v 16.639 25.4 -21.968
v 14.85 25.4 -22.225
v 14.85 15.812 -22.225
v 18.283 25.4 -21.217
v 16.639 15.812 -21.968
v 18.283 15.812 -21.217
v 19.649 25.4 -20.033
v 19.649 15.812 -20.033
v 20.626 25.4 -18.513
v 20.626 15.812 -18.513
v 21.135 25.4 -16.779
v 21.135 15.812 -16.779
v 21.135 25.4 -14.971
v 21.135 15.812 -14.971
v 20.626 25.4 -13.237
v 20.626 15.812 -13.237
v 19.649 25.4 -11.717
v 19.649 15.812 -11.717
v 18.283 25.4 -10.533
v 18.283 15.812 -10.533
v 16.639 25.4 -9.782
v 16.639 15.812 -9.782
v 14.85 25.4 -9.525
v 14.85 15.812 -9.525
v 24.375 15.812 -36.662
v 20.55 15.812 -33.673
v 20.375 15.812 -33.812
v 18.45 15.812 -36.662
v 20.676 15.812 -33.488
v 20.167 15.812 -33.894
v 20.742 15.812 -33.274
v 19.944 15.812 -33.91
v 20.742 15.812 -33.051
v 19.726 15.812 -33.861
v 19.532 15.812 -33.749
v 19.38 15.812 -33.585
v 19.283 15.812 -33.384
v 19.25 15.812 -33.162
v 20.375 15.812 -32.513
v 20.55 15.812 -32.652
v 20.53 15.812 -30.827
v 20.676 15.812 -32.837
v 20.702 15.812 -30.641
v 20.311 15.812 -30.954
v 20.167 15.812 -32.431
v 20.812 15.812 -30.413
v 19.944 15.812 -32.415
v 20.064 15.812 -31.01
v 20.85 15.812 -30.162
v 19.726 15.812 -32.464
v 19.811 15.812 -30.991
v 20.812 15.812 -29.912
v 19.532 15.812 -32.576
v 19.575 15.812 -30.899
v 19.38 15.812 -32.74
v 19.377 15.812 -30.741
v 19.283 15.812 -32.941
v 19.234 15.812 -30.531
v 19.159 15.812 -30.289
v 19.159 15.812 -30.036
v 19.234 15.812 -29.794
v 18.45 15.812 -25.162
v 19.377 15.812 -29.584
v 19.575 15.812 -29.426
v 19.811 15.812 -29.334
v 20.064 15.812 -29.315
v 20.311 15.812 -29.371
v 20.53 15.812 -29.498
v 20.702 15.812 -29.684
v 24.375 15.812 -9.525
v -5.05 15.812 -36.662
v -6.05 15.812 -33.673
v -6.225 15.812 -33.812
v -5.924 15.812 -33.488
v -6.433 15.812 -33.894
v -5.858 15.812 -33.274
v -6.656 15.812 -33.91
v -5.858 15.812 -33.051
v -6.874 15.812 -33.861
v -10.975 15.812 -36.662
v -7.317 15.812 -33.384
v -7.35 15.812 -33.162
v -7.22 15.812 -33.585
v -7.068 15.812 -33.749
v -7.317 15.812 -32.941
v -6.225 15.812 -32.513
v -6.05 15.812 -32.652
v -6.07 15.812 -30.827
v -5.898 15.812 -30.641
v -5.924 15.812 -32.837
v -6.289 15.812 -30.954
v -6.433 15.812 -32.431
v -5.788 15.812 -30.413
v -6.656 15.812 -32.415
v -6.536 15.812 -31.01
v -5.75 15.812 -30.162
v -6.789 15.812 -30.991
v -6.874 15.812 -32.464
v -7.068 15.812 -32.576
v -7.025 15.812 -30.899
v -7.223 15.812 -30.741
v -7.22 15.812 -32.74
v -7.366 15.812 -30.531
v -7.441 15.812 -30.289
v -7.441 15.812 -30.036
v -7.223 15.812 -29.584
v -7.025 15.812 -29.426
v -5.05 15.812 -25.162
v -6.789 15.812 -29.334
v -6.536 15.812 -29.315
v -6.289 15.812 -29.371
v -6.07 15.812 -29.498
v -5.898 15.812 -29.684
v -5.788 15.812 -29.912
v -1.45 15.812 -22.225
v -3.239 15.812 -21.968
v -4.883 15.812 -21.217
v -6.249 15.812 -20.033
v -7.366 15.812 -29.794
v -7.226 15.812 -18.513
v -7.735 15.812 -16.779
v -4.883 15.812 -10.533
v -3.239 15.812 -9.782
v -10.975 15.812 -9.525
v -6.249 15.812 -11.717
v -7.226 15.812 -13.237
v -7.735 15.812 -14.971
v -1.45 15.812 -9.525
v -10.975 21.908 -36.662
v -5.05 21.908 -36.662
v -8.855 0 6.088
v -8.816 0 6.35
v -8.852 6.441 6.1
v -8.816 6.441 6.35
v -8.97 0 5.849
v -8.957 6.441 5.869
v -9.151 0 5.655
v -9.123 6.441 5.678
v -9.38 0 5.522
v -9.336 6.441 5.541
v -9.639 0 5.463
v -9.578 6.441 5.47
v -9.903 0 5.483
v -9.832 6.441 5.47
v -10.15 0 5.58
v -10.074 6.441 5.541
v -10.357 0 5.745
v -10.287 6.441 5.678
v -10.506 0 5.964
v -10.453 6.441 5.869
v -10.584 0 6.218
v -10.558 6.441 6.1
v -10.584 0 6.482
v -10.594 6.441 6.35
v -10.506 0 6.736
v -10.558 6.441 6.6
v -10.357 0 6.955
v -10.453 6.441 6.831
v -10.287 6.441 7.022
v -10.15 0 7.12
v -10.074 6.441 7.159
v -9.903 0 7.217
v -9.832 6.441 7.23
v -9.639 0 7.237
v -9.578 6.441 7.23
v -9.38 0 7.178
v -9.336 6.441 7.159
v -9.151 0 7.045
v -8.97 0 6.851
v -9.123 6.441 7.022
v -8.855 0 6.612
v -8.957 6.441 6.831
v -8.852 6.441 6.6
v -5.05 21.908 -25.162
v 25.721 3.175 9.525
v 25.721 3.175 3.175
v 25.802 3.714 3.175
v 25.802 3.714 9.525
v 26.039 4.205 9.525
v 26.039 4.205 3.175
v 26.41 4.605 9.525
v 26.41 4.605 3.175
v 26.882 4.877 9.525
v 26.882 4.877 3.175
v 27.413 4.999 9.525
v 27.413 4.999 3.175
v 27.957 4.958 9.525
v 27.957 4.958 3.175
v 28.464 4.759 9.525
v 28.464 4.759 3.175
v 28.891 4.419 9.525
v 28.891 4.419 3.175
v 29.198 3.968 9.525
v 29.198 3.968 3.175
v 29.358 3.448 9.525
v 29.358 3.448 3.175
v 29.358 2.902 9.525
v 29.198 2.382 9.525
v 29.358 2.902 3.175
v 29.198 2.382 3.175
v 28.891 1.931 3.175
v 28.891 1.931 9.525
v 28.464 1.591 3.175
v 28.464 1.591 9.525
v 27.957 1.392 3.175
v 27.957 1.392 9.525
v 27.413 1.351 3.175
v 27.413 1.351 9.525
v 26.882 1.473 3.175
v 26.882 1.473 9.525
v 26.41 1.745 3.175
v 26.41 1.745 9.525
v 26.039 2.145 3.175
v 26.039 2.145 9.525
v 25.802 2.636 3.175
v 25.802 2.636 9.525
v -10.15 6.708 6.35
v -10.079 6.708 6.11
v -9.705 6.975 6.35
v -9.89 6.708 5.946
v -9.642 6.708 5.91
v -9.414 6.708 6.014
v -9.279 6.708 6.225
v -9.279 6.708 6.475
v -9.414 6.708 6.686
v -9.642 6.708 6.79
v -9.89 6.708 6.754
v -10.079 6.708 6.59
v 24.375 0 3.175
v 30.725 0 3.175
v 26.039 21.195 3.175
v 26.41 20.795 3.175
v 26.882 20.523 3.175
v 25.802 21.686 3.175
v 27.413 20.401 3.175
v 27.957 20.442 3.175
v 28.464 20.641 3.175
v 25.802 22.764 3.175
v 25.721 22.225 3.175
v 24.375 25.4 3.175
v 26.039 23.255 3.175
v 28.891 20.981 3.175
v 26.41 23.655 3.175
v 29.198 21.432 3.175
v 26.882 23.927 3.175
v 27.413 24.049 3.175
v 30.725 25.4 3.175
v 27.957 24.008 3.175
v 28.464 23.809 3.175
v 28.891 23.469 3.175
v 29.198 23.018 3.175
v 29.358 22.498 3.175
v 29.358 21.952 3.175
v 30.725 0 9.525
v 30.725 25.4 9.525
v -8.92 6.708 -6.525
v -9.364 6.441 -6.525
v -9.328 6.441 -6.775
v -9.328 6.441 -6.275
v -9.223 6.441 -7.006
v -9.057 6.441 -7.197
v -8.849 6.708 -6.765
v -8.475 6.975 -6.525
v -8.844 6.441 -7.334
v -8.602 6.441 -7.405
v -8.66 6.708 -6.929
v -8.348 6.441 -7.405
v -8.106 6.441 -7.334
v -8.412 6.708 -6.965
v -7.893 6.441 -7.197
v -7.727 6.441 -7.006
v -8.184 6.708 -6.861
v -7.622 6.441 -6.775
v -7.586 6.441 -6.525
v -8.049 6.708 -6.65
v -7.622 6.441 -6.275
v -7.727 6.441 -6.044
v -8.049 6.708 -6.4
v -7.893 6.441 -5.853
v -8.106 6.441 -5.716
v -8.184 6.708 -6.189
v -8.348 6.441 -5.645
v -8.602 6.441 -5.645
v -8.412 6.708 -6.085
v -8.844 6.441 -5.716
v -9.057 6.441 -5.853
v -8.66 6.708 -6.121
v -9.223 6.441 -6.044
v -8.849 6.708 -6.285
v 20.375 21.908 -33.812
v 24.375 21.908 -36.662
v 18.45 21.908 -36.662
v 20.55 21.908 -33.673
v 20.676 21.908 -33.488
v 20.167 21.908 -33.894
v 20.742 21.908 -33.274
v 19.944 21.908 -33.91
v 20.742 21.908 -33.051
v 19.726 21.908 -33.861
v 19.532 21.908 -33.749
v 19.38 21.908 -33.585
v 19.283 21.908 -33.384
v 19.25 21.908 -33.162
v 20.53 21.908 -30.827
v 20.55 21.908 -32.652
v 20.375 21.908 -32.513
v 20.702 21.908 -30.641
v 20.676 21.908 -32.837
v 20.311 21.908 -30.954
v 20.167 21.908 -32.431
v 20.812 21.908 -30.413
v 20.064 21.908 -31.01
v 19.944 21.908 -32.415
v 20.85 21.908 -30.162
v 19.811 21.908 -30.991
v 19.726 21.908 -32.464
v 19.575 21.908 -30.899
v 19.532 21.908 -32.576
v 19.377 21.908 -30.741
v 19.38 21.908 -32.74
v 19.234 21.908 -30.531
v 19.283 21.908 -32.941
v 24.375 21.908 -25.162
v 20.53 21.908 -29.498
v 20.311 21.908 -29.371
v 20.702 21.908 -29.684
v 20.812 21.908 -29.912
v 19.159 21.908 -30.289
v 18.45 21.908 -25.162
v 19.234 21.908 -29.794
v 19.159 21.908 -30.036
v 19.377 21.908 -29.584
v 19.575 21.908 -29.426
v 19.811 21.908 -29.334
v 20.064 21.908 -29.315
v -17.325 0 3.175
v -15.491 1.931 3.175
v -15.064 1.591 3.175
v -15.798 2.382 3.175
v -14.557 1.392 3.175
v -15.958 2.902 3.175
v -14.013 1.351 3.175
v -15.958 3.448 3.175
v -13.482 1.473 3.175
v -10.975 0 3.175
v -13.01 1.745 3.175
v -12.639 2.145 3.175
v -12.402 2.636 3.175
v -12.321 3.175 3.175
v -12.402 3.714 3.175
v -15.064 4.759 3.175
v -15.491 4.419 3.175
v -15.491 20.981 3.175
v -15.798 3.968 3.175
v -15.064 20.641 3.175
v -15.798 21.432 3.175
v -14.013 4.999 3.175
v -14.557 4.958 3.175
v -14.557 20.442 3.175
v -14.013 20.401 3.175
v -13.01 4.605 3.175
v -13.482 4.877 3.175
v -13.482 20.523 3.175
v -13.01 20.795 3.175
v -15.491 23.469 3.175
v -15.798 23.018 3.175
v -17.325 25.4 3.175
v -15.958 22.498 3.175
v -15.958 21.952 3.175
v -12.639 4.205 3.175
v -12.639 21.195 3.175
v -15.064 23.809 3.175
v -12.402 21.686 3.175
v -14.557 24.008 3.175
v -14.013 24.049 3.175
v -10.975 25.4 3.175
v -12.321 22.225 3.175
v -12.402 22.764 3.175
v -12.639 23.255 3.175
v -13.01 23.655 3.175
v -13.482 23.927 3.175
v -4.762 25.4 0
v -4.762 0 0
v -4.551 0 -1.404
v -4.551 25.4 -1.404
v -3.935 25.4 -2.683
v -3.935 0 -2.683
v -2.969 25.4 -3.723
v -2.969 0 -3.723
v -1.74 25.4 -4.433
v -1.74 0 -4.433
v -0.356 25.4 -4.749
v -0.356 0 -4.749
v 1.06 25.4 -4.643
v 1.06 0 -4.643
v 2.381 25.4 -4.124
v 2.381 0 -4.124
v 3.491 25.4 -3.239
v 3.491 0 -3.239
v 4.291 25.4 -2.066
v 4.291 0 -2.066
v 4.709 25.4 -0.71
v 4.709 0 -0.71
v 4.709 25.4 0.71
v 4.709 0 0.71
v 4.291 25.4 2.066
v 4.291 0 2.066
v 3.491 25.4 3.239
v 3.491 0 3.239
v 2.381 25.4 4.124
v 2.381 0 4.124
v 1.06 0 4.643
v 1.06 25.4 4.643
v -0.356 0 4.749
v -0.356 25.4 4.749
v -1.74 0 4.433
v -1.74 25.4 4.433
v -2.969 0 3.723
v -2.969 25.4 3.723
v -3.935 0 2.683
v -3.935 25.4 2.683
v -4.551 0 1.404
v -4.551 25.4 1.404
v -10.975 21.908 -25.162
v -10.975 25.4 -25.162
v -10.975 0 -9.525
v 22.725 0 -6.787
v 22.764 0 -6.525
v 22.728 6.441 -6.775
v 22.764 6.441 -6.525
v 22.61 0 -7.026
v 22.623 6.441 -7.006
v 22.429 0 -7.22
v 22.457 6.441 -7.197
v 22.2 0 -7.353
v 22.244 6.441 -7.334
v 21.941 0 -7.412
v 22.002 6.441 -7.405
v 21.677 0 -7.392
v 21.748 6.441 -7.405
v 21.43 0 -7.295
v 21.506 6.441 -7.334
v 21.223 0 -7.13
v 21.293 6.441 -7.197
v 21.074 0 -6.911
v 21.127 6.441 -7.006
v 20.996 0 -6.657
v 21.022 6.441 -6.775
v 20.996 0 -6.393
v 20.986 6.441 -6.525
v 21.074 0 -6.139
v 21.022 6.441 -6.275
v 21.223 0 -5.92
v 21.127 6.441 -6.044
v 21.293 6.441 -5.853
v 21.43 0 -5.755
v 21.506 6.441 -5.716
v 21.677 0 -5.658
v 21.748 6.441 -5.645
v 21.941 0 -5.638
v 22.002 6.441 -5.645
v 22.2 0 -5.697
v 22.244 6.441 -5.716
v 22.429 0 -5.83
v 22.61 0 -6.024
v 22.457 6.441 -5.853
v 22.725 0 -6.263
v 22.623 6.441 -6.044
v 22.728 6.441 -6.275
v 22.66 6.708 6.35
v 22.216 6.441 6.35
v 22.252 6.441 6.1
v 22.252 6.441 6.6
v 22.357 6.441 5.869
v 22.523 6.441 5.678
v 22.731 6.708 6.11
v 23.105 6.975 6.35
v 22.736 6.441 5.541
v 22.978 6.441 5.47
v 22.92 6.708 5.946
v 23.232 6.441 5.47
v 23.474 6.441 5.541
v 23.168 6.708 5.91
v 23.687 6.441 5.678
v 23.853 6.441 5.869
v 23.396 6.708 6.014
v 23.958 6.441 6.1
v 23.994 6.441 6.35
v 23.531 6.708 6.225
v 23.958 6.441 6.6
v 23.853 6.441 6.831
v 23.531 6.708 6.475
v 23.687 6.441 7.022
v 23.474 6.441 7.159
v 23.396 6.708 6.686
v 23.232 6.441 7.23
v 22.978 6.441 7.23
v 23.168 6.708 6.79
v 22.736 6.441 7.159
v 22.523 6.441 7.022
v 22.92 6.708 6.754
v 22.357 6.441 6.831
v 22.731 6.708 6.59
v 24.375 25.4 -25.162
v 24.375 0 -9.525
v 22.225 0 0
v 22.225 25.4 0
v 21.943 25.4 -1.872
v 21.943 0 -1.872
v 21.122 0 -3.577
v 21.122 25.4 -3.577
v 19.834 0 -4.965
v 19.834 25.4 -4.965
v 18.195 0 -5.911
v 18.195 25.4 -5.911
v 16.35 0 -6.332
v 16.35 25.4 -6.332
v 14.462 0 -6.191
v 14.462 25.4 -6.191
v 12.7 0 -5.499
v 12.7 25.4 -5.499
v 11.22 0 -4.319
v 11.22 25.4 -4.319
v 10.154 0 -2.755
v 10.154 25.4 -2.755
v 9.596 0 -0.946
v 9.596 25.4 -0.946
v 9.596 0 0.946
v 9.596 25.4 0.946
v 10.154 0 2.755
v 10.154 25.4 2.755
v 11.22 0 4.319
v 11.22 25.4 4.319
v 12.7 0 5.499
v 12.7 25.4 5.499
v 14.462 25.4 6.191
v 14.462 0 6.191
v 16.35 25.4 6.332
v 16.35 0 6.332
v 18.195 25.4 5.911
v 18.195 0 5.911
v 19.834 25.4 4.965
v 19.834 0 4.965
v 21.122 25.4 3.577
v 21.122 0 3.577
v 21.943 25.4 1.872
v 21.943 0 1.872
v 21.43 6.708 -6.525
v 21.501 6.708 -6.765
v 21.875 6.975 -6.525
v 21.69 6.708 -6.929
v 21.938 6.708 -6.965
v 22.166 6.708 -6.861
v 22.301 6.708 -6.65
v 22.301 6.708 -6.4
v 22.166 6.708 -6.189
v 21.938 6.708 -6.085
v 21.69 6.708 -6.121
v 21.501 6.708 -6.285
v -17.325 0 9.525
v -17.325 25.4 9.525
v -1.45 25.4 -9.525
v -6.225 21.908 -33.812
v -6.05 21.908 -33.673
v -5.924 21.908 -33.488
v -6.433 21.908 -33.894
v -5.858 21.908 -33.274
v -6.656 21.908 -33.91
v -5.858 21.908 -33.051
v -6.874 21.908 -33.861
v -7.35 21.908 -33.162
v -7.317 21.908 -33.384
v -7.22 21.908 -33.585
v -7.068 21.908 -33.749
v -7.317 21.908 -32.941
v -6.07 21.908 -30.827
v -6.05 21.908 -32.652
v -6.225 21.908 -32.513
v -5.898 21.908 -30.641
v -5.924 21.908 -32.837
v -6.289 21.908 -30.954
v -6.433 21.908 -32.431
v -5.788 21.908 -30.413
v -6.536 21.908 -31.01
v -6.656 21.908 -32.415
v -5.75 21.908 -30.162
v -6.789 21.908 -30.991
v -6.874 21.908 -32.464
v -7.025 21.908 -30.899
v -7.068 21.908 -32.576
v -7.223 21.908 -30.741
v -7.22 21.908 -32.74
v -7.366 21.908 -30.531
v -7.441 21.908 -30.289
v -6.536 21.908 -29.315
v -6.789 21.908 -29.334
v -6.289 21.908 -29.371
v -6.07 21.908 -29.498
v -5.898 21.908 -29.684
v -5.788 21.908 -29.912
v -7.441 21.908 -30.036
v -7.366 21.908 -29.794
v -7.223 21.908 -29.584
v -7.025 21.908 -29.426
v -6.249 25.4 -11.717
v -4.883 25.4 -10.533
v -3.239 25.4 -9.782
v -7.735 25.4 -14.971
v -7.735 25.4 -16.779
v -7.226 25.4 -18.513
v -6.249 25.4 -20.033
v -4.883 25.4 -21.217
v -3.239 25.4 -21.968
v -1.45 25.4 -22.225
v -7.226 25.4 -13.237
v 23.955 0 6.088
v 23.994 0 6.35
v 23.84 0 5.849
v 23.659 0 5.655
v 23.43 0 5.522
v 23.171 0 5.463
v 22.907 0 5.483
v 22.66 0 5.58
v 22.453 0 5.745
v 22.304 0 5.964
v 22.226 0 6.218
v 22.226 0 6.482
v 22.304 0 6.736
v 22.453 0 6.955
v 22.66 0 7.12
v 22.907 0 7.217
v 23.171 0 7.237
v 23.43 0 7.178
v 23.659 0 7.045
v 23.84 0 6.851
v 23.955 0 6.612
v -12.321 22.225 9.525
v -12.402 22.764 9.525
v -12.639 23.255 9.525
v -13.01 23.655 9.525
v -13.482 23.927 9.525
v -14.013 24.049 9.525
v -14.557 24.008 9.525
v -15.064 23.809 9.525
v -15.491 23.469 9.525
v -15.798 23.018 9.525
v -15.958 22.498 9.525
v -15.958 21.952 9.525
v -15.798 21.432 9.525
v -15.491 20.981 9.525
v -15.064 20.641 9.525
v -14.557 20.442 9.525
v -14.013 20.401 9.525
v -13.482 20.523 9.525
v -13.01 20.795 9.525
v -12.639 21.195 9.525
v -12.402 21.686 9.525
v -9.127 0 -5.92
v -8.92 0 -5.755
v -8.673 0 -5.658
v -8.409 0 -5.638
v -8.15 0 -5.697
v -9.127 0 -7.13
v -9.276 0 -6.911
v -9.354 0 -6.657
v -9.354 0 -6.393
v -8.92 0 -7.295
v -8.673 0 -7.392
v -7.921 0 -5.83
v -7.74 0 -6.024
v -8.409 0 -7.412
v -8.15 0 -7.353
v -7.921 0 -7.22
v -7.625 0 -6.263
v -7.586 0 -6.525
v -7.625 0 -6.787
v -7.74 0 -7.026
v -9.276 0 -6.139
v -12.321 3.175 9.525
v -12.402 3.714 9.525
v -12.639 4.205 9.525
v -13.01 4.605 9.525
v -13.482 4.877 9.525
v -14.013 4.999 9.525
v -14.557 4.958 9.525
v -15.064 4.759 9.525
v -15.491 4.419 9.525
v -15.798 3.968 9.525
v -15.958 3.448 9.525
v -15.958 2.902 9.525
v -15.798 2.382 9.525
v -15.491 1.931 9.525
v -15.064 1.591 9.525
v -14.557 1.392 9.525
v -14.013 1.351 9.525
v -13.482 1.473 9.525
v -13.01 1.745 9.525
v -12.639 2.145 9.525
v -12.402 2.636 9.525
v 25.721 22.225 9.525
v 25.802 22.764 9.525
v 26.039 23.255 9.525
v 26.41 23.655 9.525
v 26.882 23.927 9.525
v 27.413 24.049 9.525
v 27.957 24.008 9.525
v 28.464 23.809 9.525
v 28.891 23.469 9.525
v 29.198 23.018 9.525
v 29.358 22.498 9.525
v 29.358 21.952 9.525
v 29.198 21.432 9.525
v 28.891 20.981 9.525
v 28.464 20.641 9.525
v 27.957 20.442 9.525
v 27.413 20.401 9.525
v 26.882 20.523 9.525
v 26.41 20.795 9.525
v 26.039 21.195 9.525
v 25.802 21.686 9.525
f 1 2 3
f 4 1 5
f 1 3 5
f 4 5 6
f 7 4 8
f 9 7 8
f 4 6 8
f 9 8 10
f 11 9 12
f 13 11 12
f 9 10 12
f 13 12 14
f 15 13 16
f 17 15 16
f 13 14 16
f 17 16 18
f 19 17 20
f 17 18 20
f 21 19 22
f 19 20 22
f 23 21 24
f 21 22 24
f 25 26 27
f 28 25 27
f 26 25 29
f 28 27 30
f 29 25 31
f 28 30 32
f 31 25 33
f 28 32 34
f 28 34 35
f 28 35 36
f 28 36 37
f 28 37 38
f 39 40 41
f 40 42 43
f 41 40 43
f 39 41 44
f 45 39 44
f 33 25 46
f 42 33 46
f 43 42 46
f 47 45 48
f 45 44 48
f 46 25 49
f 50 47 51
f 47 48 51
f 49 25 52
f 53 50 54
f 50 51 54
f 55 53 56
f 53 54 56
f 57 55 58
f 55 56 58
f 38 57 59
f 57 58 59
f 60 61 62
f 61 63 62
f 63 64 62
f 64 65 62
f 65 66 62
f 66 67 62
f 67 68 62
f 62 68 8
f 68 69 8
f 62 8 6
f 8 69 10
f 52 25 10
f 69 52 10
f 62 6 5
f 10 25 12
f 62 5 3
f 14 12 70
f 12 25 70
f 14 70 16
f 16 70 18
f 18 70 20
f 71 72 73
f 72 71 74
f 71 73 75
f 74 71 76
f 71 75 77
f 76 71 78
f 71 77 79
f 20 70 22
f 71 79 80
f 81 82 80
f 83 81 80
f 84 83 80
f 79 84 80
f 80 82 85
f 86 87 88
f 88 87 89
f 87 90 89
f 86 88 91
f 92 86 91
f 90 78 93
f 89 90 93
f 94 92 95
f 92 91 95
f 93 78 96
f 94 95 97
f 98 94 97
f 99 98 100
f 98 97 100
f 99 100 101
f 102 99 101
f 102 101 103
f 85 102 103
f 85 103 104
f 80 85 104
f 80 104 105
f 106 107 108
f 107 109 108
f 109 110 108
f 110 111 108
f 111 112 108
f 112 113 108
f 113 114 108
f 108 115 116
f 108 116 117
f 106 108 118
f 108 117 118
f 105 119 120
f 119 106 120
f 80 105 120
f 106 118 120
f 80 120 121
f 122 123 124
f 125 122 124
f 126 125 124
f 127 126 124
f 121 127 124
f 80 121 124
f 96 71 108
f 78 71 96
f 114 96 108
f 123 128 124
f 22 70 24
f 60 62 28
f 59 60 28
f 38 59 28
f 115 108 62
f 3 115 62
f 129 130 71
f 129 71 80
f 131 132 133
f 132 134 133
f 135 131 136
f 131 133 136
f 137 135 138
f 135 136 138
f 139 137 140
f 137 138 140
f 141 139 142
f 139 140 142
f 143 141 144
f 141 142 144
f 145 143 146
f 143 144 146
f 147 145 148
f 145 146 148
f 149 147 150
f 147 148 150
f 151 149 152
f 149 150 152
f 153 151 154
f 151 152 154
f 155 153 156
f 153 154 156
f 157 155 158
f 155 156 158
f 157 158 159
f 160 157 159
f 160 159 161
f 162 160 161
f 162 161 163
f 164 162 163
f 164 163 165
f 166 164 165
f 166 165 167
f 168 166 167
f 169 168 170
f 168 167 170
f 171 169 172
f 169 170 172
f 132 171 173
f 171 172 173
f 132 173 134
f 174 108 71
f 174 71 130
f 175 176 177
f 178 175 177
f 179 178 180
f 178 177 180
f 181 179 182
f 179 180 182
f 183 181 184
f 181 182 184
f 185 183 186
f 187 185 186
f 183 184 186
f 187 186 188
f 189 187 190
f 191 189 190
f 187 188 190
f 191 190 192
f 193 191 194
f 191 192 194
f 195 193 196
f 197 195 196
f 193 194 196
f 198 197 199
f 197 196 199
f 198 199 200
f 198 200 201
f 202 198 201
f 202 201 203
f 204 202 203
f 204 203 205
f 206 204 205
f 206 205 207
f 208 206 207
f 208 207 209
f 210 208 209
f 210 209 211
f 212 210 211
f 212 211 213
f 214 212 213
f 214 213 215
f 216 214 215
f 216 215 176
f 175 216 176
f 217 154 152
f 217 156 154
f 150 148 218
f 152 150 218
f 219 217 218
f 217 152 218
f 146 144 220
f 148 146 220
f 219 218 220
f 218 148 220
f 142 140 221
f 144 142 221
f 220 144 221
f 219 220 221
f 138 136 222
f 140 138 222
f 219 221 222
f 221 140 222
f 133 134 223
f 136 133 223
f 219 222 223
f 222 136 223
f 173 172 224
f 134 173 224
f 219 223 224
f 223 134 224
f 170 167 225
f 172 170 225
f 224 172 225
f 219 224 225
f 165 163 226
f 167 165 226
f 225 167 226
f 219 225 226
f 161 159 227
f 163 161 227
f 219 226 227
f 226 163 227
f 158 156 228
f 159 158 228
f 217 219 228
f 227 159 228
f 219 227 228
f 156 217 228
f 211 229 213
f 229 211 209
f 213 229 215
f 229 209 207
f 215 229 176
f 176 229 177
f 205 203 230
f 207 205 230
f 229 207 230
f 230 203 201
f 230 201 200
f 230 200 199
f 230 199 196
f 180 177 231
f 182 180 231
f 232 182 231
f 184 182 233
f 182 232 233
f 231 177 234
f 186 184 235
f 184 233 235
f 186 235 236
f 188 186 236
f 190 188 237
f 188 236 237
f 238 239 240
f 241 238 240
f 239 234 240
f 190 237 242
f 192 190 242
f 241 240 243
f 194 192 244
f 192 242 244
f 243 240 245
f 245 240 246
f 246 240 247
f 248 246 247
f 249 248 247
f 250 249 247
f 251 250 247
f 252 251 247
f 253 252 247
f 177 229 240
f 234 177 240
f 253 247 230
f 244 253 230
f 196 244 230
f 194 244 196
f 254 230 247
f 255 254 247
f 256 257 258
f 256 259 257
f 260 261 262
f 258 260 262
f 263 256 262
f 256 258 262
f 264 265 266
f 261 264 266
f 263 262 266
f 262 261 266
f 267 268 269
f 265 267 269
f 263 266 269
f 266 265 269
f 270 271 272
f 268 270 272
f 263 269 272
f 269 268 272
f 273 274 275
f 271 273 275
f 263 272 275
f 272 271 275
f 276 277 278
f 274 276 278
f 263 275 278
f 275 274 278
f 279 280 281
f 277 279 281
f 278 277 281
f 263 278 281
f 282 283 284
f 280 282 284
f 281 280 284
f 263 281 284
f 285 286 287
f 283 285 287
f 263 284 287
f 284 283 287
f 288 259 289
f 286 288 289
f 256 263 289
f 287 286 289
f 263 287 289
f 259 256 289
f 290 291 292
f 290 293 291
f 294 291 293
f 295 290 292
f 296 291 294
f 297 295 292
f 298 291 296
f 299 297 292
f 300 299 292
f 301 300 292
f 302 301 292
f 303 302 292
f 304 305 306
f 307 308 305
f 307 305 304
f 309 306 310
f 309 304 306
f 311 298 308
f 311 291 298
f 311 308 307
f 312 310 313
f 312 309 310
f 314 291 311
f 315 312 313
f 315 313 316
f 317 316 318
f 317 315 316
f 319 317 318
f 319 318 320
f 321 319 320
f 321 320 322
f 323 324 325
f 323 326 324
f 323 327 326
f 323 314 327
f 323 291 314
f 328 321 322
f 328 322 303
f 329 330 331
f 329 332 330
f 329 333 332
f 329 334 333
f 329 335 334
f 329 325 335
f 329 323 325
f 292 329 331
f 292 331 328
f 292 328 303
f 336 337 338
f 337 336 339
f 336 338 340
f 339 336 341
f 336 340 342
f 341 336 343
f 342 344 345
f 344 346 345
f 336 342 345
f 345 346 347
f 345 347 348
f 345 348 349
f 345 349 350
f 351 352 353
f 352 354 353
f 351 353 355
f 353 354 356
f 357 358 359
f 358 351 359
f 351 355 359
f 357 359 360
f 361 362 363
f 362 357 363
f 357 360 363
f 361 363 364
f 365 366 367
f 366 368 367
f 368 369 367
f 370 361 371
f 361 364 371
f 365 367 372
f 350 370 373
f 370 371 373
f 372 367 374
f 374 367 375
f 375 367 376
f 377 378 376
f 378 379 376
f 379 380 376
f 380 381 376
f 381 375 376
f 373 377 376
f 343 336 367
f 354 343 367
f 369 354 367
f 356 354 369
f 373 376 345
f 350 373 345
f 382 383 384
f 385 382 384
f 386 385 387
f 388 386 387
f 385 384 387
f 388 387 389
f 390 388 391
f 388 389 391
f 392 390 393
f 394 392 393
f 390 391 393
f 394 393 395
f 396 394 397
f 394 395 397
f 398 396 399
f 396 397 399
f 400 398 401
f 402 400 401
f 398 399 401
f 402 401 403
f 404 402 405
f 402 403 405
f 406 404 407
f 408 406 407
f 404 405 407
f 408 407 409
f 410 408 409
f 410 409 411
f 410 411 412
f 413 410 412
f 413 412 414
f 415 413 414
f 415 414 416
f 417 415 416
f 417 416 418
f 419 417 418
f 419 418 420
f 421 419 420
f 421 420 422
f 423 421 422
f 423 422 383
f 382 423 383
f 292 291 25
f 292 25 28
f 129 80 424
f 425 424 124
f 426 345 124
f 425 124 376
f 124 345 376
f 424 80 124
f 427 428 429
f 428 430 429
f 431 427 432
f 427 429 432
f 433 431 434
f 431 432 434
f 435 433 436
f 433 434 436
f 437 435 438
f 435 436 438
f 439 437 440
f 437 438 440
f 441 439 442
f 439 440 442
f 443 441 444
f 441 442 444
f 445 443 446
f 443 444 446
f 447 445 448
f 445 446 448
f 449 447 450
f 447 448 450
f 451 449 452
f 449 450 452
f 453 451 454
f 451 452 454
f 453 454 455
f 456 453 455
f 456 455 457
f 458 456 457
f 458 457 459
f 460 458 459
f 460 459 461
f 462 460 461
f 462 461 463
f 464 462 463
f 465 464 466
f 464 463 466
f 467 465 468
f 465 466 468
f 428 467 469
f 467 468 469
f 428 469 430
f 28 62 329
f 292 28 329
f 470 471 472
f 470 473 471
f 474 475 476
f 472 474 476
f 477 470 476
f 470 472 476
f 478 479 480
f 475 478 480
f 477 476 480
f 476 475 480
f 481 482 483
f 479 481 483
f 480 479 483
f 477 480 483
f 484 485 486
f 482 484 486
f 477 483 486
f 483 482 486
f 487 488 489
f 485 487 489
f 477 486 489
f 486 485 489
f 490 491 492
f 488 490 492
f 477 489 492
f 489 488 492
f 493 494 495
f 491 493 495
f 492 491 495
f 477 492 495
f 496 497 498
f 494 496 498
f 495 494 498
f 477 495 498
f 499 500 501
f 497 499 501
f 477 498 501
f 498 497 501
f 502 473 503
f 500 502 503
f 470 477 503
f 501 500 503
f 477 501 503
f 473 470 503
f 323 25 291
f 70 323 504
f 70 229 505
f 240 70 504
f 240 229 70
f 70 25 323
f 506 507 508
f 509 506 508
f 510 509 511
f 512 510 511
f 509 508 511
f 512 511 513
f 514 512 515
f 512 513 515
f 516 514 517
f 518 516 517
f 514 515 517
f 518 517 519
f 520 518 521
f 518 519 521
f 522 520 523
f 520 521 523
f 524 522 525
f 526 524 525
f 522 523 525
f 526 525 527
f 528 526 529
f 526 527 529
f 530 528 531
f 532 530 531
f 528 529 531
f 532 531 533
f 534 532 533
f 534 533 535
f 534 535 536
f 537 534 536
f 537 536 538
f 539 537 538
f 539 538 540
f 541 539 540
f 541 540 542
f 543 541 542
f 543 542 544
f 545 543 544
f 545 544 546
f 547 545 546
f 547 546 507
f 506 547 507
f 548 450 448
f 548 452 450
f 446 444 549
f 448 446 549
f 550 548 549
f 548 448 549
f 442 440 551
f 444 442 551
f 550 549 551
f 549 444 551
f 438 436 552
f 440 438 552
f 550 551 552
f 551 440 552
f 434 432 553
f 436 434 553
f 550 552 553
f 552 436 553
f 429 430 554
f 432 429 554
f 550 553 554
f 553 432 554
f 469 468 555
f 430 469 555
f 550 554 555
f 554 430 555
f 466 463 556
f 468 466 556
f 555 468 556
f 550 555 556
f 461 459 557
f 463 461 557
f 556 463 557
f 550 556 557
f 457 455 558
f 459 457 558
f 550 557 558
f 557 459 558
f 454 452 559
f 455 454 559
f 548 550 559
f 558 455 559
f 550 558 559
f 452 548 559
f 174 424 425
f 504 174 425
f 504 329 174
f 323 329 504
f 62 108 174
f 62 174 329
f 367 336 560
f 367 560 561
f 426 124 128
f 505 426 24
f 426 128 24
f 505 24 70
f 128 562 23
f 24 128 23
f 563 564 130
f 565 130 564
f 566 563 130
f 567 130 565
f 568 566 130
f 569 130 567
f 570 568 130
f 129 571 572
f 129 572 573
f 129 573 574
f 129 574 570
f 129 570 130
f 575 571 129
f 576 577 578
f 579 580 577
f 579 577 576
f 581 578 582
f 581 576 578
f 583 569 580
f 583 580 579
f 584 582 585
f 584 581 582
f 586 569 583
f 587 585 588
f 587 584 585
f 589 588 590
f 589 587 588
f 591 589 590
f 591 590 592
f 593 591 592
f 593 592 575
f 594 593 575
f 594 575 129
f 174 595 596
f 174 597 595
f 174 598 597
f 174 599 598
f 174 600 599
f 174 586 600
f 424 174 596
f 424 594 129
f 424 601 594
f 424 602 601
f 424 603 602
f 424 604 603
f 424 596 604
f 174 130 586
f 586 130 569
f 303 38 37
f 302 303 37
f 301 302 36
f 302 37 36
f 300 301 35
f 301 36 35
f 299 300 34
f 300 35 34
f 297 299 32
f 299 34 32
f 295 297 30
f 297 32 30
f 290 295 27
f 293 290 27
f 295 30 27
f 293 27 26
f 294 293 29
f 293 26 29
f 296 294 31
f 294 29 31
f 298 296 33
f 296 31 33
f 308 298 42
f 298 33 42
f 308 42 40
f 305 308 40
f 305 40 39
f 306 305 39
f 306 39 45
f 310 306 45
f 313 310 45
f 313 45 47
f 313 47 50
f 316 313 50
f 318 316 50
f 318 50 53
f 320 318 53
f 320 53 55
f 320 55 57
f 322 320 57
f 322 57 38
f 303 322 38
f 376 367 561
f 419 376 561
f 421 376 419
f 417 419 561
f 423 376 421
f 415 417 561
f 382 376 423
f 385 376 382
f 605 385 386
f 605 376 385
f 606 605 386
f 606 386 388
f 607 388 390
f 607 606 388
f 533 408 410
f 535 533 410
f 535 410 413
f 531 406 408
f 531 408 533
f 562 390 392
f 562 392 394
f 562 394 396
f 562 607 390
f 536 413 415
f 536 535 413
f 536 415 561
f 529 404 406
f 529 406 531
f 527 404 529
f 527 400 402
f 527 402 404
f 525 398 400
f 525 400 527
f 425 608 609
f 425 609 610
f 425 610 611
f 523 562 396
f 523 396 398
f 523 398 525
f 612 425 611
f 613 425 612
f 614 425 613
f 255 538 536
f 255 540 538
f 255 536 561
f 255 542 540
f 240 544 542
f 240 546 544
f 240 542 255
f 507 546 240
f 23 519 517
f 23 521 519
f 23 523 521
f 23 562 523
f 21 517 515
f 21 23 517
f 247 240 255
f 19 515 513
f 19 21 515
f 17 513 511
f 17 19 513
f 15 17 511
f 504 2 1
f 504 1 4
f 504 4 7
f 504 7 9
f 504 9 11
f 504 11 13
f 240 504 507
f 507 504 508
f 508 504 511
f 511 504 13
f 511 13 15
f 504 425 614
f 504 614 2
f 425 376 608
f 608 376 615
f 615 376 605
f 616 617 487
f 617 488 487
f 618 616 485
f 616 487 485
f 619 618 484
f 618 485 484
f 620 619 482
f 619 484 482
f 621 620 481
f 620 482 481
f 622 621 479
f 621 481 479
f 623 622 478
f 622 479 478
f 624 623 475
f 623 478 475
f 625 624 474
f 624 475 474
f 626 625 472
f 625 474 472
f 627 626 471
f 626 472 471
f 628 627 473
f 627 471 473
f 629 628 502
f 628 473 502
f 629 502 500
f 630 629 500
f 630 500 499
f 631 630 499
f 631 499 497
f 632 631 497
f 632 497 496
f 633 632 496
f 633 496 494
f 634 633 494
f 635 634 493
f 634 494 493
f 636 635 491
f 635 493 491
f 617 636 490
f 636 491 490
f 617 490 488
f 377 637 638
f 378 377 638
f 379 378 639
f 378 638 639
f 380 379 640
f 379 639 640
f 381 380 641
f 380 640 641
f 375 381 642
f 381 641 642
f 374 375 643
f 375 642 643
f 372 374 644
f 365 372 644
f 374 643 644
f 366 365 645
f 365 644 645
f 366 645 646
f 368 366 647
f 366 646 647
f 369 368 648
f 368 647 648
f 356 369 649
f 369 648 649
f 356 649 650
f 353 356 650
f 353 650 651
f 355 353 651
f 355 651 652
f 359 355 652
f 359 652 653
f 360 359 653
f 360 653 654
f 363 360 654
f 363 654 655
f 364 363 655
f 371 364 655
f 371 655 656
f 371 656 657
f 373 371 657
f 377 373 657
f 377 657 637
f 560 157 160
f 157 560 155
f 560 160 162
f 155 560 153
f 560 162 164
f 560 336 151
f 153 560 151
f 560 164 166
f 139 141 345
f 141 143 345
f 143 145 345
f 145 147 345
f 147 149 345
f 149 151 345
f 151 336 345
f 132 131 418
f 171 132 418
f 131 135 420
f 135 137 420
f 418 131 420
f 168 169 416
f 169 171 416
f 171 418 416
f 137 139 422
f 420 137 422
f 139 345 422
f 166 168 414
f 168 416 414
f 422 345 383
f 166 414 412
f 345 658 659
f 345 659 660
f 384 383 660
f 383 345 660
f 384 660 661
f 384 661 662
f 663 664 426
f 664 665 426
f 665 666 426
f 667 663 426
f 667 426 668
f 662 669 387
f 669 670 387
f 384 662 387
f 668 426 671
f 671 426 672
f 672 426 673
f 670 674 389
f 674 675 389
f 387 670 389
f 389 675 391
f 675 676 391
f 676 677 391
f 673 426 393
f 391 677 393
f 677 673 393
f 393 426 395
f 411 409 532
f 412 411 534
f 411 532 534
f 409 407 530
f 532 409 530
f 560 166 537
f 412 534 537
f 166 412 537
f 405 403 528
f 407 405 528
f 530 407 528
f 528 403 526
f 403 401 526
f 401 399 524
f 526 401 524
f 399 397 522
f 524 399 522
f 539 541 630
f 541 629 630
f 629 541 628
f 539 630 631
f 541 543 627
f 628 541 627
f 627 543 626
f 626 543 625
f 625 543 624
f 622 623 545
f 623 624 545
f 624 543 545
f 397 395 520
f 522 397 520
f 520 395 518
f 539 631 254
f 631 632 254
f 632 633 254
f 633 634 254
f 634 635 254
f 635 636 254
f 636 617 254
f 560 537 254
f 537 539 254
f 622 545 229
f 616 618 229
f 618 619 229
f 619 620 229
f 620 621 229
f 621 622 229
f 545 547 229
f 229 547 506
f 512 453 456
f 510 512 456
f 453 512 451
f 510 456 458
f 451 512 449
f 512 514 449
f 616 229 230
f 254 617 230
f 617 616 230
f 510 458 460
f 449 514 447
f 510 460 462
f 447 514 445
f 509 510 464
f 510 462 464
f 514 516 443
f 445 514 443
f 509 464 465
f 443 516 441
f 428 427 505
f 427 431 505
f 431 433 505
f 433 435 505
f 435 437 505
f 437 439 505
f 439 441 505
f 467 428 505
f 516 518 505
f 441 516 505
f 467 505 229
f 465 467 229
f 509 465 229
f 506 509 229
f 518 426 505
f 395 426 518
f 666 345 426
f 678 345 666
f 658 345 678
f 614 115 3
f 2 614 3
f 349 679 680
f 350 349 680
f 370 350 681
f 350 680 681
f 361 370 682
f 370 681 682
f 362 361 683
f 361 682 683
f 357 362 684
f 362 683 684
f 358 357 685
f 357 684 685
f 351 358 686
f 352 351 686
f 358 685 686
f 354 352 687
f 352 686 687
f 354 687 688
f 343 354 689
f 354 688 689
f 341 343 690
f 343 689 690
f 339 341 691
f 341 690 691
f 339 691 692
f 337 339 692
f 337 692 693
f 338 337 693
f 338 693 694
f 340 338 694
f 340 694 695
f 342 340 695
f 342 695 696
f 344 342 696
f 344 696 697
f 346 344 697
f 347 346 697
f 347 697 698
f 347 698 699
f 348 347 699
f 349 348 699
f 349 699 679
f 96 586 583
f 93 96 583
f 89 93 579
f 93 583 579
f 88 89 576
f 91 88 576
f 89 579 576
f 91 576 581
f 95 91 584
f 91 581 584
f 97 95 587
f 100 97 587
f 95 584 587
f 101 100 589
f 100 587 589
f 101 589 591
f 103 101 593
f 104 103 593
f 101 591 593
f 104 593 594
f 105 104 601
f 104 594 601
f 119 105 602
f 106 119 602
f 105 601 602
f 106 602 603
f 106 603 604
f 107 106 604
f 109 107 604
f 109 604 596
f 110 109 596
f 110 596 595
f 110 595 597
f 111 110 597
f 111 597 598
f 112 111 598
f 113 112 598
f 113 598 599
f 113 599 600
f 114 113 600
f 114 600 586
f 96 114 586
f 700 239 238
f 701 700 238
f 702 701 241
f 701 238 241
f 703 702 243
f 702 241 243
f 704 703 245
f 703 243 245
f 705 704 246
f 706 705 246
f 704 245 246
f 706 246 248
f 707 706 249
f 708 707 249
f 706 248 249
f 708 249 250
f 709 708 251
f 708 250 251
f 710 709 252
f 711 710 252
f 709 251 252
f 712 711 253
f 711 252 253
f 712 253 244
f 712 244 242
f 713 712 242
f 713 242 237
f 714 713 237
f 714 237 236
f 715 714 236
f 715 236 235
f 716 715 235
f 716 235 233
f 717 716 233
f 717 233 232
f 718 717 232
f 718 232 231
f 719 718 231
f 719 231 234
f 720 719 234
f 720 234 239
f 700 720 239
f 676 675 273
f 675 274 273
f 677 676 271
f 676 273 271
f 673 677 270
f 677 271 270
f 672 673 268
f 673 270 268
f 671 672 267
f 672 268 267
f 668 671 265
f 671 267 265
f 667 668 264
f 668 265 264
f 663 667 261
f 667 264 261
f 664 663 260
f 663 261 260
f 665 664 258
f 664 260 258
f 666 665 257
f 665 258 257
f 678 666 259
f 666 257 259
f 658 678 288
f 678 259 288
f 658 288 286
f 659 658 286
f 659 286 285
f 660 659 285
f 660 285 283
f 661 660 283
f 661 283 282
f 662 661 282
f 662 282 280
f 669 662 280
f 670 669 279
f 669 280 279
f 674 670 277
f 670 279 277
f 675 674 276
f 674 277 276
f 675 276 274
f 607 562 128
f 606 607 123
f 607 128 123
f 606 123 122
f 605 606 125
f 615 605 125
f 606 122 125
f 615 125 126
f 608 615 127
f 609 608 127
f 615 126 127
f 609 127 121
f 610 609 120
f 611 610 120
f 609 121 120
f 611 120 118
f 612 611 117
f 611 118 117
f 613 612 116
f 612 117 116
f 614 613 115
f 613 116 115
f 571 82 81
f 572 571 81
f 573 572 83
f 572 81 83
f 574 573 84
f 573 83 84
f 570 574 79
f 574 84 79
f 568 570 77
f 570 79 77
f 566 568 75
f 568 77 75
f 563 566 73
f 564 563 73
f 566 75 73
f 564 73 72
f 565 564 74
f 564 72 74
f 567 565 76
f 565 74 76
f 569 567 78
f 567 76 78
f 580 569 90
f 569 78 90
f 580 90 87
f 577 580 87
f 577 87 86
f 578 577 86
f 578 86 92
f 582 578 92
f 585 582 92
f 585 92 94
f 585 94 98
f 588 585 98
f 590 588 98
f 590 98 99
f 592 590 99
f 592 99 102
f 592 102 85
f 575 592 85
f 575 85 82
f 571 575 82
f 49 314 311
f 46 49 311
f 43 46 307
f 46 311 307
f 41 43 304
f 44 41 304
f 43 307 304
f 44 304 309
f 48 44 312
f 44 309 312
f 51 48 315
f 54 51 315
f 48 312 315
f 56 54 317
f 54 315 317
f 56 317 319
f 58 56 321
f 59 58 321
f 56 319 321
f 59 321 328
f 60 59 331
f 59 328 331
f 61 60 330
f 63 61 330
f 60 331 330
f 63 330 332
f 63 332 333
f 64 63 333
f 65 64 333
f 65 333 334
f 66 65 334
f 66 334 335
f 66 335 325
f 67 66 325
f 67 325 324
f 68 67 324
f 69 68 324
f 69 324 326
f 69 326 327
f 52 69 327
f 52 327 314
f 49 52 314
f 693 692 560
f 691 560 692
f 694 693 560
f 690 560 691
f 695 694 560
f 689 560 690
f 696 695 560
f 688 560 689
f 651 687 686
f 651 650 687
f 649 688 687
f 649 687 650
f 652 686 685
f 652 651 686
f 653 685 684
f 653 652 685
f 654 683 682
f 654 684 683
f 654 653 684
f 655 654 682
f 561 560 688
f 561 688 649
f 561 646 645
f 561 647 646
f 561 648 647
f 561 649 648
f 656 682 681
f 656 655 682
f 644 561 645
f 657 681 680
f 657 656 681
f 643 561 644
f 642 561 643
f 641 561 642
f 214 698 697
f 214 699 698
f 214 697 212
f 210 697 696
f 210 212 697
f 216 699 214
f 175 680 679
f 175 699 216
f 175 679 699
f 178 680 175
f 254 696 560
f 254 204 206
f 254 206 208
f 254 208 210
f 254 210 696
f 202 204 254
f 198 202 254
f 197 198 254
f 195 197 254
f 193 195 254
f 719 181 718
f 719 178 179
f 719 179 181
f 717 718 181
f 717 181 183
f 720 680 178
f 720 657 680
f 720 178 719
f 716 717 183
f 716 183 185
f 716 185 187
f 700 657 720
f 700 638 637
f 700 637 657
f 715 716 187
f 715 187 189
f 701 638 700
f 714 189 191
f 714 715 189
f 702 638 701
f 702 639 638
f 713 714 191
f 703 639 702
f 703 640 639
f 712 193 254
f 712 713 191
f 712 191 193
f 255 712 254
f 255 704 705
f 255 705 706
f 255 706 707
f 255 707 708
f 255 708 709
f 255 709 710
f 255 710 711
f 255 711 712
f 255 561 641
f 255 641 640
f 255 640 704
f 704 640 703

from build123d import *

# Parameters (mm, degrees)
EXTRUDE_START               = 15.8125
EXTRUDE_1_OUTLINE_W         = 35.35
EXTRUDE_1_OUTLINE_H         = 28.3375
EXTRUDE_1_DEPTH             = 9.5875
SKETCH_2_W                  = 35.35
SKETCH_2_H                  = 12.7
EXTRUDE_2_DEPTH             = 15.8125
SKETCH_3_W                  = 48.05
SKETCH_3_H                  = 25.4
EXTRUDE_3_DEPTH             = 6.35
SKETCH_4_W                  = 5.925
SKETCH_4_H                  = 6.096
EXTRUDE_4_DEPTH             = 11.5
SKETCH_5_W                  = 5.925
SKETCH_5_H                  = 6.096
EXTRUDE_5_DEPTH             = 11.5
HOLE_WIZARD_1_D             = 3.6576
HOLE_WIZARD_1_DEPTH         = 46.1875
HOLE_WIZARD_2_D             = 3.6576
HOLE_WIZARD_M8_1_D          = 9.525
HOLE_WIZARD_3_D             = 12.7
HOLE_WIZARD_M1_6_1_D        = 1.778
HOLE_WIZARD_M1_6_1_DEPTH    = 6.440714286
HOLE_WIZARD_M1_6_1_TIP      = 0.53416509
HOLE_WIZARD_1_7_1_7_1_D     = 1.7
HOLE_WIZARD_1_7_1_7_1_DEPTH = 9.5875
HOLE_WIZARD_1_5_1_5_1_D     = 1.5
HOLE_WIZARD_1_5_1_5_1_DEPTH = 21.9085


with BuildPart() as part:
    # 凸台-拉伸1: read off the stored shape, not the designer's step
    # 凸台-拉伸1 outline → 凸台-拉伸1 (new body)
    with BuildSketch(Plane(origin=(0, 0, 0), x_dir=(1, 0, 0), z_dir=(0, 1, 0)).offset(EXTRUDE_START)):
        with Locations((6.7, 10.99375)):
            Rectangle(EXTRUDE_1_OUTLINE_W, EXTRUDE_1_OUTLINE_H)
        with BuildLine():
            Line((14.85, 9.525), (-1.45, 9.525))
            ThreePointArc((-1.45, 9.525), (-7.8, 15.875), (-1.45, 22.225))
            Line((-1.45, 22.225), (14.85, 22.225))
            ThreePointArc((14.85, 22.225), (21.2, 15.875), (14.85, 9.525))
        make_face(mode=Mode.SUBTRACT)
    extrude(amount=EXTRUDE_1_DEPTH)

    # 草图2 → 凸台-拉伸2 (add)
    with BuildSketch(Plane.XZ.offset(-15.8125)):
        with Locations((6.7, -3.175)):
            Rectangle(SKETCH_2_W, SKETCH_2_H)
    extrude(amount=EXTRUDE_2_DEPTH)

    # 草图3 → 凸台-拉伸3 (add)
    with BuildSketch(Plane.XY.offset(3.175)):
        with Locations((6.7, 12.7)):
            Rectangle(SKETCH_3_W, SKETCH_3_H)
    extrude(amount=EXTRUDE_3_DEPTH)

    # 草图4 → 凸台-拉伸4 (add)
    with BuildSketch(Plane(origin=(0, 0, -25.1625), x_dir=(-1, 0, 0), z_dir=(0, 0, -1))):
        with Locations((-21.4125, 18.8605)):
            Rectangle(SKETCH_4_W, SKETCH_4_H)
    extrude(amount=EXTRUDE_4_DEPTH)

    # 草图5 → 凸台-拉伸5 (add)
    with BuildSketch(Plane(origin=(0, 0, -25.1625), x_dir=(-1, 0, 0), z_dir=(0, 0, -1))):
        with Locations((8.0125, 18.8605)):
            Rectangle(SKETCH_5_W, SKETCH_5_H)
    extrude(amount=EXTRUDE_5_DEPTH)

    # 孔1
    with Locations(Plane.XY.offset(9.525)):
        with Locations((27.55, 22.225), (27.55, 3.175)):
            Hole(HOLE_WIZARD_1_D / 2, depth=HOLE_WIZARD_1_DEPTH)

    # 孔2 (through all)
    with Locations(Plane(origin=(0, 0, 3.175), x_dir=(-1, 0, 0), z_dir=(0, 0, -1))):
        with Locations((14.15, 3.175), (14.15, 22.225)):
            Hole(HOLE_WIZARD_2_D / 2)

    # M8 间隙孔1 (through all)
    with Locations(Plane(origin=(0, 25.4, 0), x_dir=(1, 0, 0), z_dir=(0, 1, 0))):
        with Locations((0, 0)):
            Hole(HOLE_WIZARD_M8_1_D / 2)

    # 孔3 (through all)
    with Locations(Plane(origin=(0, 0, 0), x_dir=(-1, 0, 0), z_dir=(0, -1, 0))):
        with Locations((-15.875, 0)):
            Hole(HOLE_WIZARD_3_D / 2)

    # M1.6 间隙孔1
    with Locations(Plane(origin=(0, 0, 0), x_dir=(-1, 0, 0), z_dir=(0, -1, 0))):
        with Locations((9.705, -6.35), (8.475, 6.525), (-21.875, 6.525), (-23.105, -6.35)):
            Hole(HOLE_WIZARD_M1_6_1_D / 2, depth=HOLE_WIZARD_M1_6_1_DEPTH)
            with Locations((0, 0, -(HOLE_WIZARD_M1_6_1_DEPTH + HOLE_WIZARD_M1_6_1_TIP / 2))):  # 118° drill point
                Cone(0, HOLE_WIZARD_M1_6_1_D / 2, HOLE_WIZARD_M1_6_1_TIP, mode=Mode.SUBTRACT)

    # Ø1.7 (1.7) 直径孔1
    with Locations(Plane(origin=(0, 15.8125, 0), x_dir=(-1, 0, 0), z_dir=(0, -1, 0))):
        with Locations((-20, 30.1625), (6.6, 30.1625)):
            Hole(HOLE_WIZARD_1_7_1_7_1_D / 2, depth=HOLE_WIZARD_1_7_1_7_1_DEPTH)

    # Ø1.5 (1.5) 直径孔1
    with Locations(Plane(origin=(0, 21.9085, 0), x_dir=(1, 0, 0), z_dir=(0, 1, 0))):
        with Locations((20, 33.1625), (-6.6, 33.1625)):
            Hole(HOLE_WIZARD_1_5_1_5_1_D / 2, depth=HOLE_WIZARD_1_5_1_5_1_DEPTH)


solid = part.part
